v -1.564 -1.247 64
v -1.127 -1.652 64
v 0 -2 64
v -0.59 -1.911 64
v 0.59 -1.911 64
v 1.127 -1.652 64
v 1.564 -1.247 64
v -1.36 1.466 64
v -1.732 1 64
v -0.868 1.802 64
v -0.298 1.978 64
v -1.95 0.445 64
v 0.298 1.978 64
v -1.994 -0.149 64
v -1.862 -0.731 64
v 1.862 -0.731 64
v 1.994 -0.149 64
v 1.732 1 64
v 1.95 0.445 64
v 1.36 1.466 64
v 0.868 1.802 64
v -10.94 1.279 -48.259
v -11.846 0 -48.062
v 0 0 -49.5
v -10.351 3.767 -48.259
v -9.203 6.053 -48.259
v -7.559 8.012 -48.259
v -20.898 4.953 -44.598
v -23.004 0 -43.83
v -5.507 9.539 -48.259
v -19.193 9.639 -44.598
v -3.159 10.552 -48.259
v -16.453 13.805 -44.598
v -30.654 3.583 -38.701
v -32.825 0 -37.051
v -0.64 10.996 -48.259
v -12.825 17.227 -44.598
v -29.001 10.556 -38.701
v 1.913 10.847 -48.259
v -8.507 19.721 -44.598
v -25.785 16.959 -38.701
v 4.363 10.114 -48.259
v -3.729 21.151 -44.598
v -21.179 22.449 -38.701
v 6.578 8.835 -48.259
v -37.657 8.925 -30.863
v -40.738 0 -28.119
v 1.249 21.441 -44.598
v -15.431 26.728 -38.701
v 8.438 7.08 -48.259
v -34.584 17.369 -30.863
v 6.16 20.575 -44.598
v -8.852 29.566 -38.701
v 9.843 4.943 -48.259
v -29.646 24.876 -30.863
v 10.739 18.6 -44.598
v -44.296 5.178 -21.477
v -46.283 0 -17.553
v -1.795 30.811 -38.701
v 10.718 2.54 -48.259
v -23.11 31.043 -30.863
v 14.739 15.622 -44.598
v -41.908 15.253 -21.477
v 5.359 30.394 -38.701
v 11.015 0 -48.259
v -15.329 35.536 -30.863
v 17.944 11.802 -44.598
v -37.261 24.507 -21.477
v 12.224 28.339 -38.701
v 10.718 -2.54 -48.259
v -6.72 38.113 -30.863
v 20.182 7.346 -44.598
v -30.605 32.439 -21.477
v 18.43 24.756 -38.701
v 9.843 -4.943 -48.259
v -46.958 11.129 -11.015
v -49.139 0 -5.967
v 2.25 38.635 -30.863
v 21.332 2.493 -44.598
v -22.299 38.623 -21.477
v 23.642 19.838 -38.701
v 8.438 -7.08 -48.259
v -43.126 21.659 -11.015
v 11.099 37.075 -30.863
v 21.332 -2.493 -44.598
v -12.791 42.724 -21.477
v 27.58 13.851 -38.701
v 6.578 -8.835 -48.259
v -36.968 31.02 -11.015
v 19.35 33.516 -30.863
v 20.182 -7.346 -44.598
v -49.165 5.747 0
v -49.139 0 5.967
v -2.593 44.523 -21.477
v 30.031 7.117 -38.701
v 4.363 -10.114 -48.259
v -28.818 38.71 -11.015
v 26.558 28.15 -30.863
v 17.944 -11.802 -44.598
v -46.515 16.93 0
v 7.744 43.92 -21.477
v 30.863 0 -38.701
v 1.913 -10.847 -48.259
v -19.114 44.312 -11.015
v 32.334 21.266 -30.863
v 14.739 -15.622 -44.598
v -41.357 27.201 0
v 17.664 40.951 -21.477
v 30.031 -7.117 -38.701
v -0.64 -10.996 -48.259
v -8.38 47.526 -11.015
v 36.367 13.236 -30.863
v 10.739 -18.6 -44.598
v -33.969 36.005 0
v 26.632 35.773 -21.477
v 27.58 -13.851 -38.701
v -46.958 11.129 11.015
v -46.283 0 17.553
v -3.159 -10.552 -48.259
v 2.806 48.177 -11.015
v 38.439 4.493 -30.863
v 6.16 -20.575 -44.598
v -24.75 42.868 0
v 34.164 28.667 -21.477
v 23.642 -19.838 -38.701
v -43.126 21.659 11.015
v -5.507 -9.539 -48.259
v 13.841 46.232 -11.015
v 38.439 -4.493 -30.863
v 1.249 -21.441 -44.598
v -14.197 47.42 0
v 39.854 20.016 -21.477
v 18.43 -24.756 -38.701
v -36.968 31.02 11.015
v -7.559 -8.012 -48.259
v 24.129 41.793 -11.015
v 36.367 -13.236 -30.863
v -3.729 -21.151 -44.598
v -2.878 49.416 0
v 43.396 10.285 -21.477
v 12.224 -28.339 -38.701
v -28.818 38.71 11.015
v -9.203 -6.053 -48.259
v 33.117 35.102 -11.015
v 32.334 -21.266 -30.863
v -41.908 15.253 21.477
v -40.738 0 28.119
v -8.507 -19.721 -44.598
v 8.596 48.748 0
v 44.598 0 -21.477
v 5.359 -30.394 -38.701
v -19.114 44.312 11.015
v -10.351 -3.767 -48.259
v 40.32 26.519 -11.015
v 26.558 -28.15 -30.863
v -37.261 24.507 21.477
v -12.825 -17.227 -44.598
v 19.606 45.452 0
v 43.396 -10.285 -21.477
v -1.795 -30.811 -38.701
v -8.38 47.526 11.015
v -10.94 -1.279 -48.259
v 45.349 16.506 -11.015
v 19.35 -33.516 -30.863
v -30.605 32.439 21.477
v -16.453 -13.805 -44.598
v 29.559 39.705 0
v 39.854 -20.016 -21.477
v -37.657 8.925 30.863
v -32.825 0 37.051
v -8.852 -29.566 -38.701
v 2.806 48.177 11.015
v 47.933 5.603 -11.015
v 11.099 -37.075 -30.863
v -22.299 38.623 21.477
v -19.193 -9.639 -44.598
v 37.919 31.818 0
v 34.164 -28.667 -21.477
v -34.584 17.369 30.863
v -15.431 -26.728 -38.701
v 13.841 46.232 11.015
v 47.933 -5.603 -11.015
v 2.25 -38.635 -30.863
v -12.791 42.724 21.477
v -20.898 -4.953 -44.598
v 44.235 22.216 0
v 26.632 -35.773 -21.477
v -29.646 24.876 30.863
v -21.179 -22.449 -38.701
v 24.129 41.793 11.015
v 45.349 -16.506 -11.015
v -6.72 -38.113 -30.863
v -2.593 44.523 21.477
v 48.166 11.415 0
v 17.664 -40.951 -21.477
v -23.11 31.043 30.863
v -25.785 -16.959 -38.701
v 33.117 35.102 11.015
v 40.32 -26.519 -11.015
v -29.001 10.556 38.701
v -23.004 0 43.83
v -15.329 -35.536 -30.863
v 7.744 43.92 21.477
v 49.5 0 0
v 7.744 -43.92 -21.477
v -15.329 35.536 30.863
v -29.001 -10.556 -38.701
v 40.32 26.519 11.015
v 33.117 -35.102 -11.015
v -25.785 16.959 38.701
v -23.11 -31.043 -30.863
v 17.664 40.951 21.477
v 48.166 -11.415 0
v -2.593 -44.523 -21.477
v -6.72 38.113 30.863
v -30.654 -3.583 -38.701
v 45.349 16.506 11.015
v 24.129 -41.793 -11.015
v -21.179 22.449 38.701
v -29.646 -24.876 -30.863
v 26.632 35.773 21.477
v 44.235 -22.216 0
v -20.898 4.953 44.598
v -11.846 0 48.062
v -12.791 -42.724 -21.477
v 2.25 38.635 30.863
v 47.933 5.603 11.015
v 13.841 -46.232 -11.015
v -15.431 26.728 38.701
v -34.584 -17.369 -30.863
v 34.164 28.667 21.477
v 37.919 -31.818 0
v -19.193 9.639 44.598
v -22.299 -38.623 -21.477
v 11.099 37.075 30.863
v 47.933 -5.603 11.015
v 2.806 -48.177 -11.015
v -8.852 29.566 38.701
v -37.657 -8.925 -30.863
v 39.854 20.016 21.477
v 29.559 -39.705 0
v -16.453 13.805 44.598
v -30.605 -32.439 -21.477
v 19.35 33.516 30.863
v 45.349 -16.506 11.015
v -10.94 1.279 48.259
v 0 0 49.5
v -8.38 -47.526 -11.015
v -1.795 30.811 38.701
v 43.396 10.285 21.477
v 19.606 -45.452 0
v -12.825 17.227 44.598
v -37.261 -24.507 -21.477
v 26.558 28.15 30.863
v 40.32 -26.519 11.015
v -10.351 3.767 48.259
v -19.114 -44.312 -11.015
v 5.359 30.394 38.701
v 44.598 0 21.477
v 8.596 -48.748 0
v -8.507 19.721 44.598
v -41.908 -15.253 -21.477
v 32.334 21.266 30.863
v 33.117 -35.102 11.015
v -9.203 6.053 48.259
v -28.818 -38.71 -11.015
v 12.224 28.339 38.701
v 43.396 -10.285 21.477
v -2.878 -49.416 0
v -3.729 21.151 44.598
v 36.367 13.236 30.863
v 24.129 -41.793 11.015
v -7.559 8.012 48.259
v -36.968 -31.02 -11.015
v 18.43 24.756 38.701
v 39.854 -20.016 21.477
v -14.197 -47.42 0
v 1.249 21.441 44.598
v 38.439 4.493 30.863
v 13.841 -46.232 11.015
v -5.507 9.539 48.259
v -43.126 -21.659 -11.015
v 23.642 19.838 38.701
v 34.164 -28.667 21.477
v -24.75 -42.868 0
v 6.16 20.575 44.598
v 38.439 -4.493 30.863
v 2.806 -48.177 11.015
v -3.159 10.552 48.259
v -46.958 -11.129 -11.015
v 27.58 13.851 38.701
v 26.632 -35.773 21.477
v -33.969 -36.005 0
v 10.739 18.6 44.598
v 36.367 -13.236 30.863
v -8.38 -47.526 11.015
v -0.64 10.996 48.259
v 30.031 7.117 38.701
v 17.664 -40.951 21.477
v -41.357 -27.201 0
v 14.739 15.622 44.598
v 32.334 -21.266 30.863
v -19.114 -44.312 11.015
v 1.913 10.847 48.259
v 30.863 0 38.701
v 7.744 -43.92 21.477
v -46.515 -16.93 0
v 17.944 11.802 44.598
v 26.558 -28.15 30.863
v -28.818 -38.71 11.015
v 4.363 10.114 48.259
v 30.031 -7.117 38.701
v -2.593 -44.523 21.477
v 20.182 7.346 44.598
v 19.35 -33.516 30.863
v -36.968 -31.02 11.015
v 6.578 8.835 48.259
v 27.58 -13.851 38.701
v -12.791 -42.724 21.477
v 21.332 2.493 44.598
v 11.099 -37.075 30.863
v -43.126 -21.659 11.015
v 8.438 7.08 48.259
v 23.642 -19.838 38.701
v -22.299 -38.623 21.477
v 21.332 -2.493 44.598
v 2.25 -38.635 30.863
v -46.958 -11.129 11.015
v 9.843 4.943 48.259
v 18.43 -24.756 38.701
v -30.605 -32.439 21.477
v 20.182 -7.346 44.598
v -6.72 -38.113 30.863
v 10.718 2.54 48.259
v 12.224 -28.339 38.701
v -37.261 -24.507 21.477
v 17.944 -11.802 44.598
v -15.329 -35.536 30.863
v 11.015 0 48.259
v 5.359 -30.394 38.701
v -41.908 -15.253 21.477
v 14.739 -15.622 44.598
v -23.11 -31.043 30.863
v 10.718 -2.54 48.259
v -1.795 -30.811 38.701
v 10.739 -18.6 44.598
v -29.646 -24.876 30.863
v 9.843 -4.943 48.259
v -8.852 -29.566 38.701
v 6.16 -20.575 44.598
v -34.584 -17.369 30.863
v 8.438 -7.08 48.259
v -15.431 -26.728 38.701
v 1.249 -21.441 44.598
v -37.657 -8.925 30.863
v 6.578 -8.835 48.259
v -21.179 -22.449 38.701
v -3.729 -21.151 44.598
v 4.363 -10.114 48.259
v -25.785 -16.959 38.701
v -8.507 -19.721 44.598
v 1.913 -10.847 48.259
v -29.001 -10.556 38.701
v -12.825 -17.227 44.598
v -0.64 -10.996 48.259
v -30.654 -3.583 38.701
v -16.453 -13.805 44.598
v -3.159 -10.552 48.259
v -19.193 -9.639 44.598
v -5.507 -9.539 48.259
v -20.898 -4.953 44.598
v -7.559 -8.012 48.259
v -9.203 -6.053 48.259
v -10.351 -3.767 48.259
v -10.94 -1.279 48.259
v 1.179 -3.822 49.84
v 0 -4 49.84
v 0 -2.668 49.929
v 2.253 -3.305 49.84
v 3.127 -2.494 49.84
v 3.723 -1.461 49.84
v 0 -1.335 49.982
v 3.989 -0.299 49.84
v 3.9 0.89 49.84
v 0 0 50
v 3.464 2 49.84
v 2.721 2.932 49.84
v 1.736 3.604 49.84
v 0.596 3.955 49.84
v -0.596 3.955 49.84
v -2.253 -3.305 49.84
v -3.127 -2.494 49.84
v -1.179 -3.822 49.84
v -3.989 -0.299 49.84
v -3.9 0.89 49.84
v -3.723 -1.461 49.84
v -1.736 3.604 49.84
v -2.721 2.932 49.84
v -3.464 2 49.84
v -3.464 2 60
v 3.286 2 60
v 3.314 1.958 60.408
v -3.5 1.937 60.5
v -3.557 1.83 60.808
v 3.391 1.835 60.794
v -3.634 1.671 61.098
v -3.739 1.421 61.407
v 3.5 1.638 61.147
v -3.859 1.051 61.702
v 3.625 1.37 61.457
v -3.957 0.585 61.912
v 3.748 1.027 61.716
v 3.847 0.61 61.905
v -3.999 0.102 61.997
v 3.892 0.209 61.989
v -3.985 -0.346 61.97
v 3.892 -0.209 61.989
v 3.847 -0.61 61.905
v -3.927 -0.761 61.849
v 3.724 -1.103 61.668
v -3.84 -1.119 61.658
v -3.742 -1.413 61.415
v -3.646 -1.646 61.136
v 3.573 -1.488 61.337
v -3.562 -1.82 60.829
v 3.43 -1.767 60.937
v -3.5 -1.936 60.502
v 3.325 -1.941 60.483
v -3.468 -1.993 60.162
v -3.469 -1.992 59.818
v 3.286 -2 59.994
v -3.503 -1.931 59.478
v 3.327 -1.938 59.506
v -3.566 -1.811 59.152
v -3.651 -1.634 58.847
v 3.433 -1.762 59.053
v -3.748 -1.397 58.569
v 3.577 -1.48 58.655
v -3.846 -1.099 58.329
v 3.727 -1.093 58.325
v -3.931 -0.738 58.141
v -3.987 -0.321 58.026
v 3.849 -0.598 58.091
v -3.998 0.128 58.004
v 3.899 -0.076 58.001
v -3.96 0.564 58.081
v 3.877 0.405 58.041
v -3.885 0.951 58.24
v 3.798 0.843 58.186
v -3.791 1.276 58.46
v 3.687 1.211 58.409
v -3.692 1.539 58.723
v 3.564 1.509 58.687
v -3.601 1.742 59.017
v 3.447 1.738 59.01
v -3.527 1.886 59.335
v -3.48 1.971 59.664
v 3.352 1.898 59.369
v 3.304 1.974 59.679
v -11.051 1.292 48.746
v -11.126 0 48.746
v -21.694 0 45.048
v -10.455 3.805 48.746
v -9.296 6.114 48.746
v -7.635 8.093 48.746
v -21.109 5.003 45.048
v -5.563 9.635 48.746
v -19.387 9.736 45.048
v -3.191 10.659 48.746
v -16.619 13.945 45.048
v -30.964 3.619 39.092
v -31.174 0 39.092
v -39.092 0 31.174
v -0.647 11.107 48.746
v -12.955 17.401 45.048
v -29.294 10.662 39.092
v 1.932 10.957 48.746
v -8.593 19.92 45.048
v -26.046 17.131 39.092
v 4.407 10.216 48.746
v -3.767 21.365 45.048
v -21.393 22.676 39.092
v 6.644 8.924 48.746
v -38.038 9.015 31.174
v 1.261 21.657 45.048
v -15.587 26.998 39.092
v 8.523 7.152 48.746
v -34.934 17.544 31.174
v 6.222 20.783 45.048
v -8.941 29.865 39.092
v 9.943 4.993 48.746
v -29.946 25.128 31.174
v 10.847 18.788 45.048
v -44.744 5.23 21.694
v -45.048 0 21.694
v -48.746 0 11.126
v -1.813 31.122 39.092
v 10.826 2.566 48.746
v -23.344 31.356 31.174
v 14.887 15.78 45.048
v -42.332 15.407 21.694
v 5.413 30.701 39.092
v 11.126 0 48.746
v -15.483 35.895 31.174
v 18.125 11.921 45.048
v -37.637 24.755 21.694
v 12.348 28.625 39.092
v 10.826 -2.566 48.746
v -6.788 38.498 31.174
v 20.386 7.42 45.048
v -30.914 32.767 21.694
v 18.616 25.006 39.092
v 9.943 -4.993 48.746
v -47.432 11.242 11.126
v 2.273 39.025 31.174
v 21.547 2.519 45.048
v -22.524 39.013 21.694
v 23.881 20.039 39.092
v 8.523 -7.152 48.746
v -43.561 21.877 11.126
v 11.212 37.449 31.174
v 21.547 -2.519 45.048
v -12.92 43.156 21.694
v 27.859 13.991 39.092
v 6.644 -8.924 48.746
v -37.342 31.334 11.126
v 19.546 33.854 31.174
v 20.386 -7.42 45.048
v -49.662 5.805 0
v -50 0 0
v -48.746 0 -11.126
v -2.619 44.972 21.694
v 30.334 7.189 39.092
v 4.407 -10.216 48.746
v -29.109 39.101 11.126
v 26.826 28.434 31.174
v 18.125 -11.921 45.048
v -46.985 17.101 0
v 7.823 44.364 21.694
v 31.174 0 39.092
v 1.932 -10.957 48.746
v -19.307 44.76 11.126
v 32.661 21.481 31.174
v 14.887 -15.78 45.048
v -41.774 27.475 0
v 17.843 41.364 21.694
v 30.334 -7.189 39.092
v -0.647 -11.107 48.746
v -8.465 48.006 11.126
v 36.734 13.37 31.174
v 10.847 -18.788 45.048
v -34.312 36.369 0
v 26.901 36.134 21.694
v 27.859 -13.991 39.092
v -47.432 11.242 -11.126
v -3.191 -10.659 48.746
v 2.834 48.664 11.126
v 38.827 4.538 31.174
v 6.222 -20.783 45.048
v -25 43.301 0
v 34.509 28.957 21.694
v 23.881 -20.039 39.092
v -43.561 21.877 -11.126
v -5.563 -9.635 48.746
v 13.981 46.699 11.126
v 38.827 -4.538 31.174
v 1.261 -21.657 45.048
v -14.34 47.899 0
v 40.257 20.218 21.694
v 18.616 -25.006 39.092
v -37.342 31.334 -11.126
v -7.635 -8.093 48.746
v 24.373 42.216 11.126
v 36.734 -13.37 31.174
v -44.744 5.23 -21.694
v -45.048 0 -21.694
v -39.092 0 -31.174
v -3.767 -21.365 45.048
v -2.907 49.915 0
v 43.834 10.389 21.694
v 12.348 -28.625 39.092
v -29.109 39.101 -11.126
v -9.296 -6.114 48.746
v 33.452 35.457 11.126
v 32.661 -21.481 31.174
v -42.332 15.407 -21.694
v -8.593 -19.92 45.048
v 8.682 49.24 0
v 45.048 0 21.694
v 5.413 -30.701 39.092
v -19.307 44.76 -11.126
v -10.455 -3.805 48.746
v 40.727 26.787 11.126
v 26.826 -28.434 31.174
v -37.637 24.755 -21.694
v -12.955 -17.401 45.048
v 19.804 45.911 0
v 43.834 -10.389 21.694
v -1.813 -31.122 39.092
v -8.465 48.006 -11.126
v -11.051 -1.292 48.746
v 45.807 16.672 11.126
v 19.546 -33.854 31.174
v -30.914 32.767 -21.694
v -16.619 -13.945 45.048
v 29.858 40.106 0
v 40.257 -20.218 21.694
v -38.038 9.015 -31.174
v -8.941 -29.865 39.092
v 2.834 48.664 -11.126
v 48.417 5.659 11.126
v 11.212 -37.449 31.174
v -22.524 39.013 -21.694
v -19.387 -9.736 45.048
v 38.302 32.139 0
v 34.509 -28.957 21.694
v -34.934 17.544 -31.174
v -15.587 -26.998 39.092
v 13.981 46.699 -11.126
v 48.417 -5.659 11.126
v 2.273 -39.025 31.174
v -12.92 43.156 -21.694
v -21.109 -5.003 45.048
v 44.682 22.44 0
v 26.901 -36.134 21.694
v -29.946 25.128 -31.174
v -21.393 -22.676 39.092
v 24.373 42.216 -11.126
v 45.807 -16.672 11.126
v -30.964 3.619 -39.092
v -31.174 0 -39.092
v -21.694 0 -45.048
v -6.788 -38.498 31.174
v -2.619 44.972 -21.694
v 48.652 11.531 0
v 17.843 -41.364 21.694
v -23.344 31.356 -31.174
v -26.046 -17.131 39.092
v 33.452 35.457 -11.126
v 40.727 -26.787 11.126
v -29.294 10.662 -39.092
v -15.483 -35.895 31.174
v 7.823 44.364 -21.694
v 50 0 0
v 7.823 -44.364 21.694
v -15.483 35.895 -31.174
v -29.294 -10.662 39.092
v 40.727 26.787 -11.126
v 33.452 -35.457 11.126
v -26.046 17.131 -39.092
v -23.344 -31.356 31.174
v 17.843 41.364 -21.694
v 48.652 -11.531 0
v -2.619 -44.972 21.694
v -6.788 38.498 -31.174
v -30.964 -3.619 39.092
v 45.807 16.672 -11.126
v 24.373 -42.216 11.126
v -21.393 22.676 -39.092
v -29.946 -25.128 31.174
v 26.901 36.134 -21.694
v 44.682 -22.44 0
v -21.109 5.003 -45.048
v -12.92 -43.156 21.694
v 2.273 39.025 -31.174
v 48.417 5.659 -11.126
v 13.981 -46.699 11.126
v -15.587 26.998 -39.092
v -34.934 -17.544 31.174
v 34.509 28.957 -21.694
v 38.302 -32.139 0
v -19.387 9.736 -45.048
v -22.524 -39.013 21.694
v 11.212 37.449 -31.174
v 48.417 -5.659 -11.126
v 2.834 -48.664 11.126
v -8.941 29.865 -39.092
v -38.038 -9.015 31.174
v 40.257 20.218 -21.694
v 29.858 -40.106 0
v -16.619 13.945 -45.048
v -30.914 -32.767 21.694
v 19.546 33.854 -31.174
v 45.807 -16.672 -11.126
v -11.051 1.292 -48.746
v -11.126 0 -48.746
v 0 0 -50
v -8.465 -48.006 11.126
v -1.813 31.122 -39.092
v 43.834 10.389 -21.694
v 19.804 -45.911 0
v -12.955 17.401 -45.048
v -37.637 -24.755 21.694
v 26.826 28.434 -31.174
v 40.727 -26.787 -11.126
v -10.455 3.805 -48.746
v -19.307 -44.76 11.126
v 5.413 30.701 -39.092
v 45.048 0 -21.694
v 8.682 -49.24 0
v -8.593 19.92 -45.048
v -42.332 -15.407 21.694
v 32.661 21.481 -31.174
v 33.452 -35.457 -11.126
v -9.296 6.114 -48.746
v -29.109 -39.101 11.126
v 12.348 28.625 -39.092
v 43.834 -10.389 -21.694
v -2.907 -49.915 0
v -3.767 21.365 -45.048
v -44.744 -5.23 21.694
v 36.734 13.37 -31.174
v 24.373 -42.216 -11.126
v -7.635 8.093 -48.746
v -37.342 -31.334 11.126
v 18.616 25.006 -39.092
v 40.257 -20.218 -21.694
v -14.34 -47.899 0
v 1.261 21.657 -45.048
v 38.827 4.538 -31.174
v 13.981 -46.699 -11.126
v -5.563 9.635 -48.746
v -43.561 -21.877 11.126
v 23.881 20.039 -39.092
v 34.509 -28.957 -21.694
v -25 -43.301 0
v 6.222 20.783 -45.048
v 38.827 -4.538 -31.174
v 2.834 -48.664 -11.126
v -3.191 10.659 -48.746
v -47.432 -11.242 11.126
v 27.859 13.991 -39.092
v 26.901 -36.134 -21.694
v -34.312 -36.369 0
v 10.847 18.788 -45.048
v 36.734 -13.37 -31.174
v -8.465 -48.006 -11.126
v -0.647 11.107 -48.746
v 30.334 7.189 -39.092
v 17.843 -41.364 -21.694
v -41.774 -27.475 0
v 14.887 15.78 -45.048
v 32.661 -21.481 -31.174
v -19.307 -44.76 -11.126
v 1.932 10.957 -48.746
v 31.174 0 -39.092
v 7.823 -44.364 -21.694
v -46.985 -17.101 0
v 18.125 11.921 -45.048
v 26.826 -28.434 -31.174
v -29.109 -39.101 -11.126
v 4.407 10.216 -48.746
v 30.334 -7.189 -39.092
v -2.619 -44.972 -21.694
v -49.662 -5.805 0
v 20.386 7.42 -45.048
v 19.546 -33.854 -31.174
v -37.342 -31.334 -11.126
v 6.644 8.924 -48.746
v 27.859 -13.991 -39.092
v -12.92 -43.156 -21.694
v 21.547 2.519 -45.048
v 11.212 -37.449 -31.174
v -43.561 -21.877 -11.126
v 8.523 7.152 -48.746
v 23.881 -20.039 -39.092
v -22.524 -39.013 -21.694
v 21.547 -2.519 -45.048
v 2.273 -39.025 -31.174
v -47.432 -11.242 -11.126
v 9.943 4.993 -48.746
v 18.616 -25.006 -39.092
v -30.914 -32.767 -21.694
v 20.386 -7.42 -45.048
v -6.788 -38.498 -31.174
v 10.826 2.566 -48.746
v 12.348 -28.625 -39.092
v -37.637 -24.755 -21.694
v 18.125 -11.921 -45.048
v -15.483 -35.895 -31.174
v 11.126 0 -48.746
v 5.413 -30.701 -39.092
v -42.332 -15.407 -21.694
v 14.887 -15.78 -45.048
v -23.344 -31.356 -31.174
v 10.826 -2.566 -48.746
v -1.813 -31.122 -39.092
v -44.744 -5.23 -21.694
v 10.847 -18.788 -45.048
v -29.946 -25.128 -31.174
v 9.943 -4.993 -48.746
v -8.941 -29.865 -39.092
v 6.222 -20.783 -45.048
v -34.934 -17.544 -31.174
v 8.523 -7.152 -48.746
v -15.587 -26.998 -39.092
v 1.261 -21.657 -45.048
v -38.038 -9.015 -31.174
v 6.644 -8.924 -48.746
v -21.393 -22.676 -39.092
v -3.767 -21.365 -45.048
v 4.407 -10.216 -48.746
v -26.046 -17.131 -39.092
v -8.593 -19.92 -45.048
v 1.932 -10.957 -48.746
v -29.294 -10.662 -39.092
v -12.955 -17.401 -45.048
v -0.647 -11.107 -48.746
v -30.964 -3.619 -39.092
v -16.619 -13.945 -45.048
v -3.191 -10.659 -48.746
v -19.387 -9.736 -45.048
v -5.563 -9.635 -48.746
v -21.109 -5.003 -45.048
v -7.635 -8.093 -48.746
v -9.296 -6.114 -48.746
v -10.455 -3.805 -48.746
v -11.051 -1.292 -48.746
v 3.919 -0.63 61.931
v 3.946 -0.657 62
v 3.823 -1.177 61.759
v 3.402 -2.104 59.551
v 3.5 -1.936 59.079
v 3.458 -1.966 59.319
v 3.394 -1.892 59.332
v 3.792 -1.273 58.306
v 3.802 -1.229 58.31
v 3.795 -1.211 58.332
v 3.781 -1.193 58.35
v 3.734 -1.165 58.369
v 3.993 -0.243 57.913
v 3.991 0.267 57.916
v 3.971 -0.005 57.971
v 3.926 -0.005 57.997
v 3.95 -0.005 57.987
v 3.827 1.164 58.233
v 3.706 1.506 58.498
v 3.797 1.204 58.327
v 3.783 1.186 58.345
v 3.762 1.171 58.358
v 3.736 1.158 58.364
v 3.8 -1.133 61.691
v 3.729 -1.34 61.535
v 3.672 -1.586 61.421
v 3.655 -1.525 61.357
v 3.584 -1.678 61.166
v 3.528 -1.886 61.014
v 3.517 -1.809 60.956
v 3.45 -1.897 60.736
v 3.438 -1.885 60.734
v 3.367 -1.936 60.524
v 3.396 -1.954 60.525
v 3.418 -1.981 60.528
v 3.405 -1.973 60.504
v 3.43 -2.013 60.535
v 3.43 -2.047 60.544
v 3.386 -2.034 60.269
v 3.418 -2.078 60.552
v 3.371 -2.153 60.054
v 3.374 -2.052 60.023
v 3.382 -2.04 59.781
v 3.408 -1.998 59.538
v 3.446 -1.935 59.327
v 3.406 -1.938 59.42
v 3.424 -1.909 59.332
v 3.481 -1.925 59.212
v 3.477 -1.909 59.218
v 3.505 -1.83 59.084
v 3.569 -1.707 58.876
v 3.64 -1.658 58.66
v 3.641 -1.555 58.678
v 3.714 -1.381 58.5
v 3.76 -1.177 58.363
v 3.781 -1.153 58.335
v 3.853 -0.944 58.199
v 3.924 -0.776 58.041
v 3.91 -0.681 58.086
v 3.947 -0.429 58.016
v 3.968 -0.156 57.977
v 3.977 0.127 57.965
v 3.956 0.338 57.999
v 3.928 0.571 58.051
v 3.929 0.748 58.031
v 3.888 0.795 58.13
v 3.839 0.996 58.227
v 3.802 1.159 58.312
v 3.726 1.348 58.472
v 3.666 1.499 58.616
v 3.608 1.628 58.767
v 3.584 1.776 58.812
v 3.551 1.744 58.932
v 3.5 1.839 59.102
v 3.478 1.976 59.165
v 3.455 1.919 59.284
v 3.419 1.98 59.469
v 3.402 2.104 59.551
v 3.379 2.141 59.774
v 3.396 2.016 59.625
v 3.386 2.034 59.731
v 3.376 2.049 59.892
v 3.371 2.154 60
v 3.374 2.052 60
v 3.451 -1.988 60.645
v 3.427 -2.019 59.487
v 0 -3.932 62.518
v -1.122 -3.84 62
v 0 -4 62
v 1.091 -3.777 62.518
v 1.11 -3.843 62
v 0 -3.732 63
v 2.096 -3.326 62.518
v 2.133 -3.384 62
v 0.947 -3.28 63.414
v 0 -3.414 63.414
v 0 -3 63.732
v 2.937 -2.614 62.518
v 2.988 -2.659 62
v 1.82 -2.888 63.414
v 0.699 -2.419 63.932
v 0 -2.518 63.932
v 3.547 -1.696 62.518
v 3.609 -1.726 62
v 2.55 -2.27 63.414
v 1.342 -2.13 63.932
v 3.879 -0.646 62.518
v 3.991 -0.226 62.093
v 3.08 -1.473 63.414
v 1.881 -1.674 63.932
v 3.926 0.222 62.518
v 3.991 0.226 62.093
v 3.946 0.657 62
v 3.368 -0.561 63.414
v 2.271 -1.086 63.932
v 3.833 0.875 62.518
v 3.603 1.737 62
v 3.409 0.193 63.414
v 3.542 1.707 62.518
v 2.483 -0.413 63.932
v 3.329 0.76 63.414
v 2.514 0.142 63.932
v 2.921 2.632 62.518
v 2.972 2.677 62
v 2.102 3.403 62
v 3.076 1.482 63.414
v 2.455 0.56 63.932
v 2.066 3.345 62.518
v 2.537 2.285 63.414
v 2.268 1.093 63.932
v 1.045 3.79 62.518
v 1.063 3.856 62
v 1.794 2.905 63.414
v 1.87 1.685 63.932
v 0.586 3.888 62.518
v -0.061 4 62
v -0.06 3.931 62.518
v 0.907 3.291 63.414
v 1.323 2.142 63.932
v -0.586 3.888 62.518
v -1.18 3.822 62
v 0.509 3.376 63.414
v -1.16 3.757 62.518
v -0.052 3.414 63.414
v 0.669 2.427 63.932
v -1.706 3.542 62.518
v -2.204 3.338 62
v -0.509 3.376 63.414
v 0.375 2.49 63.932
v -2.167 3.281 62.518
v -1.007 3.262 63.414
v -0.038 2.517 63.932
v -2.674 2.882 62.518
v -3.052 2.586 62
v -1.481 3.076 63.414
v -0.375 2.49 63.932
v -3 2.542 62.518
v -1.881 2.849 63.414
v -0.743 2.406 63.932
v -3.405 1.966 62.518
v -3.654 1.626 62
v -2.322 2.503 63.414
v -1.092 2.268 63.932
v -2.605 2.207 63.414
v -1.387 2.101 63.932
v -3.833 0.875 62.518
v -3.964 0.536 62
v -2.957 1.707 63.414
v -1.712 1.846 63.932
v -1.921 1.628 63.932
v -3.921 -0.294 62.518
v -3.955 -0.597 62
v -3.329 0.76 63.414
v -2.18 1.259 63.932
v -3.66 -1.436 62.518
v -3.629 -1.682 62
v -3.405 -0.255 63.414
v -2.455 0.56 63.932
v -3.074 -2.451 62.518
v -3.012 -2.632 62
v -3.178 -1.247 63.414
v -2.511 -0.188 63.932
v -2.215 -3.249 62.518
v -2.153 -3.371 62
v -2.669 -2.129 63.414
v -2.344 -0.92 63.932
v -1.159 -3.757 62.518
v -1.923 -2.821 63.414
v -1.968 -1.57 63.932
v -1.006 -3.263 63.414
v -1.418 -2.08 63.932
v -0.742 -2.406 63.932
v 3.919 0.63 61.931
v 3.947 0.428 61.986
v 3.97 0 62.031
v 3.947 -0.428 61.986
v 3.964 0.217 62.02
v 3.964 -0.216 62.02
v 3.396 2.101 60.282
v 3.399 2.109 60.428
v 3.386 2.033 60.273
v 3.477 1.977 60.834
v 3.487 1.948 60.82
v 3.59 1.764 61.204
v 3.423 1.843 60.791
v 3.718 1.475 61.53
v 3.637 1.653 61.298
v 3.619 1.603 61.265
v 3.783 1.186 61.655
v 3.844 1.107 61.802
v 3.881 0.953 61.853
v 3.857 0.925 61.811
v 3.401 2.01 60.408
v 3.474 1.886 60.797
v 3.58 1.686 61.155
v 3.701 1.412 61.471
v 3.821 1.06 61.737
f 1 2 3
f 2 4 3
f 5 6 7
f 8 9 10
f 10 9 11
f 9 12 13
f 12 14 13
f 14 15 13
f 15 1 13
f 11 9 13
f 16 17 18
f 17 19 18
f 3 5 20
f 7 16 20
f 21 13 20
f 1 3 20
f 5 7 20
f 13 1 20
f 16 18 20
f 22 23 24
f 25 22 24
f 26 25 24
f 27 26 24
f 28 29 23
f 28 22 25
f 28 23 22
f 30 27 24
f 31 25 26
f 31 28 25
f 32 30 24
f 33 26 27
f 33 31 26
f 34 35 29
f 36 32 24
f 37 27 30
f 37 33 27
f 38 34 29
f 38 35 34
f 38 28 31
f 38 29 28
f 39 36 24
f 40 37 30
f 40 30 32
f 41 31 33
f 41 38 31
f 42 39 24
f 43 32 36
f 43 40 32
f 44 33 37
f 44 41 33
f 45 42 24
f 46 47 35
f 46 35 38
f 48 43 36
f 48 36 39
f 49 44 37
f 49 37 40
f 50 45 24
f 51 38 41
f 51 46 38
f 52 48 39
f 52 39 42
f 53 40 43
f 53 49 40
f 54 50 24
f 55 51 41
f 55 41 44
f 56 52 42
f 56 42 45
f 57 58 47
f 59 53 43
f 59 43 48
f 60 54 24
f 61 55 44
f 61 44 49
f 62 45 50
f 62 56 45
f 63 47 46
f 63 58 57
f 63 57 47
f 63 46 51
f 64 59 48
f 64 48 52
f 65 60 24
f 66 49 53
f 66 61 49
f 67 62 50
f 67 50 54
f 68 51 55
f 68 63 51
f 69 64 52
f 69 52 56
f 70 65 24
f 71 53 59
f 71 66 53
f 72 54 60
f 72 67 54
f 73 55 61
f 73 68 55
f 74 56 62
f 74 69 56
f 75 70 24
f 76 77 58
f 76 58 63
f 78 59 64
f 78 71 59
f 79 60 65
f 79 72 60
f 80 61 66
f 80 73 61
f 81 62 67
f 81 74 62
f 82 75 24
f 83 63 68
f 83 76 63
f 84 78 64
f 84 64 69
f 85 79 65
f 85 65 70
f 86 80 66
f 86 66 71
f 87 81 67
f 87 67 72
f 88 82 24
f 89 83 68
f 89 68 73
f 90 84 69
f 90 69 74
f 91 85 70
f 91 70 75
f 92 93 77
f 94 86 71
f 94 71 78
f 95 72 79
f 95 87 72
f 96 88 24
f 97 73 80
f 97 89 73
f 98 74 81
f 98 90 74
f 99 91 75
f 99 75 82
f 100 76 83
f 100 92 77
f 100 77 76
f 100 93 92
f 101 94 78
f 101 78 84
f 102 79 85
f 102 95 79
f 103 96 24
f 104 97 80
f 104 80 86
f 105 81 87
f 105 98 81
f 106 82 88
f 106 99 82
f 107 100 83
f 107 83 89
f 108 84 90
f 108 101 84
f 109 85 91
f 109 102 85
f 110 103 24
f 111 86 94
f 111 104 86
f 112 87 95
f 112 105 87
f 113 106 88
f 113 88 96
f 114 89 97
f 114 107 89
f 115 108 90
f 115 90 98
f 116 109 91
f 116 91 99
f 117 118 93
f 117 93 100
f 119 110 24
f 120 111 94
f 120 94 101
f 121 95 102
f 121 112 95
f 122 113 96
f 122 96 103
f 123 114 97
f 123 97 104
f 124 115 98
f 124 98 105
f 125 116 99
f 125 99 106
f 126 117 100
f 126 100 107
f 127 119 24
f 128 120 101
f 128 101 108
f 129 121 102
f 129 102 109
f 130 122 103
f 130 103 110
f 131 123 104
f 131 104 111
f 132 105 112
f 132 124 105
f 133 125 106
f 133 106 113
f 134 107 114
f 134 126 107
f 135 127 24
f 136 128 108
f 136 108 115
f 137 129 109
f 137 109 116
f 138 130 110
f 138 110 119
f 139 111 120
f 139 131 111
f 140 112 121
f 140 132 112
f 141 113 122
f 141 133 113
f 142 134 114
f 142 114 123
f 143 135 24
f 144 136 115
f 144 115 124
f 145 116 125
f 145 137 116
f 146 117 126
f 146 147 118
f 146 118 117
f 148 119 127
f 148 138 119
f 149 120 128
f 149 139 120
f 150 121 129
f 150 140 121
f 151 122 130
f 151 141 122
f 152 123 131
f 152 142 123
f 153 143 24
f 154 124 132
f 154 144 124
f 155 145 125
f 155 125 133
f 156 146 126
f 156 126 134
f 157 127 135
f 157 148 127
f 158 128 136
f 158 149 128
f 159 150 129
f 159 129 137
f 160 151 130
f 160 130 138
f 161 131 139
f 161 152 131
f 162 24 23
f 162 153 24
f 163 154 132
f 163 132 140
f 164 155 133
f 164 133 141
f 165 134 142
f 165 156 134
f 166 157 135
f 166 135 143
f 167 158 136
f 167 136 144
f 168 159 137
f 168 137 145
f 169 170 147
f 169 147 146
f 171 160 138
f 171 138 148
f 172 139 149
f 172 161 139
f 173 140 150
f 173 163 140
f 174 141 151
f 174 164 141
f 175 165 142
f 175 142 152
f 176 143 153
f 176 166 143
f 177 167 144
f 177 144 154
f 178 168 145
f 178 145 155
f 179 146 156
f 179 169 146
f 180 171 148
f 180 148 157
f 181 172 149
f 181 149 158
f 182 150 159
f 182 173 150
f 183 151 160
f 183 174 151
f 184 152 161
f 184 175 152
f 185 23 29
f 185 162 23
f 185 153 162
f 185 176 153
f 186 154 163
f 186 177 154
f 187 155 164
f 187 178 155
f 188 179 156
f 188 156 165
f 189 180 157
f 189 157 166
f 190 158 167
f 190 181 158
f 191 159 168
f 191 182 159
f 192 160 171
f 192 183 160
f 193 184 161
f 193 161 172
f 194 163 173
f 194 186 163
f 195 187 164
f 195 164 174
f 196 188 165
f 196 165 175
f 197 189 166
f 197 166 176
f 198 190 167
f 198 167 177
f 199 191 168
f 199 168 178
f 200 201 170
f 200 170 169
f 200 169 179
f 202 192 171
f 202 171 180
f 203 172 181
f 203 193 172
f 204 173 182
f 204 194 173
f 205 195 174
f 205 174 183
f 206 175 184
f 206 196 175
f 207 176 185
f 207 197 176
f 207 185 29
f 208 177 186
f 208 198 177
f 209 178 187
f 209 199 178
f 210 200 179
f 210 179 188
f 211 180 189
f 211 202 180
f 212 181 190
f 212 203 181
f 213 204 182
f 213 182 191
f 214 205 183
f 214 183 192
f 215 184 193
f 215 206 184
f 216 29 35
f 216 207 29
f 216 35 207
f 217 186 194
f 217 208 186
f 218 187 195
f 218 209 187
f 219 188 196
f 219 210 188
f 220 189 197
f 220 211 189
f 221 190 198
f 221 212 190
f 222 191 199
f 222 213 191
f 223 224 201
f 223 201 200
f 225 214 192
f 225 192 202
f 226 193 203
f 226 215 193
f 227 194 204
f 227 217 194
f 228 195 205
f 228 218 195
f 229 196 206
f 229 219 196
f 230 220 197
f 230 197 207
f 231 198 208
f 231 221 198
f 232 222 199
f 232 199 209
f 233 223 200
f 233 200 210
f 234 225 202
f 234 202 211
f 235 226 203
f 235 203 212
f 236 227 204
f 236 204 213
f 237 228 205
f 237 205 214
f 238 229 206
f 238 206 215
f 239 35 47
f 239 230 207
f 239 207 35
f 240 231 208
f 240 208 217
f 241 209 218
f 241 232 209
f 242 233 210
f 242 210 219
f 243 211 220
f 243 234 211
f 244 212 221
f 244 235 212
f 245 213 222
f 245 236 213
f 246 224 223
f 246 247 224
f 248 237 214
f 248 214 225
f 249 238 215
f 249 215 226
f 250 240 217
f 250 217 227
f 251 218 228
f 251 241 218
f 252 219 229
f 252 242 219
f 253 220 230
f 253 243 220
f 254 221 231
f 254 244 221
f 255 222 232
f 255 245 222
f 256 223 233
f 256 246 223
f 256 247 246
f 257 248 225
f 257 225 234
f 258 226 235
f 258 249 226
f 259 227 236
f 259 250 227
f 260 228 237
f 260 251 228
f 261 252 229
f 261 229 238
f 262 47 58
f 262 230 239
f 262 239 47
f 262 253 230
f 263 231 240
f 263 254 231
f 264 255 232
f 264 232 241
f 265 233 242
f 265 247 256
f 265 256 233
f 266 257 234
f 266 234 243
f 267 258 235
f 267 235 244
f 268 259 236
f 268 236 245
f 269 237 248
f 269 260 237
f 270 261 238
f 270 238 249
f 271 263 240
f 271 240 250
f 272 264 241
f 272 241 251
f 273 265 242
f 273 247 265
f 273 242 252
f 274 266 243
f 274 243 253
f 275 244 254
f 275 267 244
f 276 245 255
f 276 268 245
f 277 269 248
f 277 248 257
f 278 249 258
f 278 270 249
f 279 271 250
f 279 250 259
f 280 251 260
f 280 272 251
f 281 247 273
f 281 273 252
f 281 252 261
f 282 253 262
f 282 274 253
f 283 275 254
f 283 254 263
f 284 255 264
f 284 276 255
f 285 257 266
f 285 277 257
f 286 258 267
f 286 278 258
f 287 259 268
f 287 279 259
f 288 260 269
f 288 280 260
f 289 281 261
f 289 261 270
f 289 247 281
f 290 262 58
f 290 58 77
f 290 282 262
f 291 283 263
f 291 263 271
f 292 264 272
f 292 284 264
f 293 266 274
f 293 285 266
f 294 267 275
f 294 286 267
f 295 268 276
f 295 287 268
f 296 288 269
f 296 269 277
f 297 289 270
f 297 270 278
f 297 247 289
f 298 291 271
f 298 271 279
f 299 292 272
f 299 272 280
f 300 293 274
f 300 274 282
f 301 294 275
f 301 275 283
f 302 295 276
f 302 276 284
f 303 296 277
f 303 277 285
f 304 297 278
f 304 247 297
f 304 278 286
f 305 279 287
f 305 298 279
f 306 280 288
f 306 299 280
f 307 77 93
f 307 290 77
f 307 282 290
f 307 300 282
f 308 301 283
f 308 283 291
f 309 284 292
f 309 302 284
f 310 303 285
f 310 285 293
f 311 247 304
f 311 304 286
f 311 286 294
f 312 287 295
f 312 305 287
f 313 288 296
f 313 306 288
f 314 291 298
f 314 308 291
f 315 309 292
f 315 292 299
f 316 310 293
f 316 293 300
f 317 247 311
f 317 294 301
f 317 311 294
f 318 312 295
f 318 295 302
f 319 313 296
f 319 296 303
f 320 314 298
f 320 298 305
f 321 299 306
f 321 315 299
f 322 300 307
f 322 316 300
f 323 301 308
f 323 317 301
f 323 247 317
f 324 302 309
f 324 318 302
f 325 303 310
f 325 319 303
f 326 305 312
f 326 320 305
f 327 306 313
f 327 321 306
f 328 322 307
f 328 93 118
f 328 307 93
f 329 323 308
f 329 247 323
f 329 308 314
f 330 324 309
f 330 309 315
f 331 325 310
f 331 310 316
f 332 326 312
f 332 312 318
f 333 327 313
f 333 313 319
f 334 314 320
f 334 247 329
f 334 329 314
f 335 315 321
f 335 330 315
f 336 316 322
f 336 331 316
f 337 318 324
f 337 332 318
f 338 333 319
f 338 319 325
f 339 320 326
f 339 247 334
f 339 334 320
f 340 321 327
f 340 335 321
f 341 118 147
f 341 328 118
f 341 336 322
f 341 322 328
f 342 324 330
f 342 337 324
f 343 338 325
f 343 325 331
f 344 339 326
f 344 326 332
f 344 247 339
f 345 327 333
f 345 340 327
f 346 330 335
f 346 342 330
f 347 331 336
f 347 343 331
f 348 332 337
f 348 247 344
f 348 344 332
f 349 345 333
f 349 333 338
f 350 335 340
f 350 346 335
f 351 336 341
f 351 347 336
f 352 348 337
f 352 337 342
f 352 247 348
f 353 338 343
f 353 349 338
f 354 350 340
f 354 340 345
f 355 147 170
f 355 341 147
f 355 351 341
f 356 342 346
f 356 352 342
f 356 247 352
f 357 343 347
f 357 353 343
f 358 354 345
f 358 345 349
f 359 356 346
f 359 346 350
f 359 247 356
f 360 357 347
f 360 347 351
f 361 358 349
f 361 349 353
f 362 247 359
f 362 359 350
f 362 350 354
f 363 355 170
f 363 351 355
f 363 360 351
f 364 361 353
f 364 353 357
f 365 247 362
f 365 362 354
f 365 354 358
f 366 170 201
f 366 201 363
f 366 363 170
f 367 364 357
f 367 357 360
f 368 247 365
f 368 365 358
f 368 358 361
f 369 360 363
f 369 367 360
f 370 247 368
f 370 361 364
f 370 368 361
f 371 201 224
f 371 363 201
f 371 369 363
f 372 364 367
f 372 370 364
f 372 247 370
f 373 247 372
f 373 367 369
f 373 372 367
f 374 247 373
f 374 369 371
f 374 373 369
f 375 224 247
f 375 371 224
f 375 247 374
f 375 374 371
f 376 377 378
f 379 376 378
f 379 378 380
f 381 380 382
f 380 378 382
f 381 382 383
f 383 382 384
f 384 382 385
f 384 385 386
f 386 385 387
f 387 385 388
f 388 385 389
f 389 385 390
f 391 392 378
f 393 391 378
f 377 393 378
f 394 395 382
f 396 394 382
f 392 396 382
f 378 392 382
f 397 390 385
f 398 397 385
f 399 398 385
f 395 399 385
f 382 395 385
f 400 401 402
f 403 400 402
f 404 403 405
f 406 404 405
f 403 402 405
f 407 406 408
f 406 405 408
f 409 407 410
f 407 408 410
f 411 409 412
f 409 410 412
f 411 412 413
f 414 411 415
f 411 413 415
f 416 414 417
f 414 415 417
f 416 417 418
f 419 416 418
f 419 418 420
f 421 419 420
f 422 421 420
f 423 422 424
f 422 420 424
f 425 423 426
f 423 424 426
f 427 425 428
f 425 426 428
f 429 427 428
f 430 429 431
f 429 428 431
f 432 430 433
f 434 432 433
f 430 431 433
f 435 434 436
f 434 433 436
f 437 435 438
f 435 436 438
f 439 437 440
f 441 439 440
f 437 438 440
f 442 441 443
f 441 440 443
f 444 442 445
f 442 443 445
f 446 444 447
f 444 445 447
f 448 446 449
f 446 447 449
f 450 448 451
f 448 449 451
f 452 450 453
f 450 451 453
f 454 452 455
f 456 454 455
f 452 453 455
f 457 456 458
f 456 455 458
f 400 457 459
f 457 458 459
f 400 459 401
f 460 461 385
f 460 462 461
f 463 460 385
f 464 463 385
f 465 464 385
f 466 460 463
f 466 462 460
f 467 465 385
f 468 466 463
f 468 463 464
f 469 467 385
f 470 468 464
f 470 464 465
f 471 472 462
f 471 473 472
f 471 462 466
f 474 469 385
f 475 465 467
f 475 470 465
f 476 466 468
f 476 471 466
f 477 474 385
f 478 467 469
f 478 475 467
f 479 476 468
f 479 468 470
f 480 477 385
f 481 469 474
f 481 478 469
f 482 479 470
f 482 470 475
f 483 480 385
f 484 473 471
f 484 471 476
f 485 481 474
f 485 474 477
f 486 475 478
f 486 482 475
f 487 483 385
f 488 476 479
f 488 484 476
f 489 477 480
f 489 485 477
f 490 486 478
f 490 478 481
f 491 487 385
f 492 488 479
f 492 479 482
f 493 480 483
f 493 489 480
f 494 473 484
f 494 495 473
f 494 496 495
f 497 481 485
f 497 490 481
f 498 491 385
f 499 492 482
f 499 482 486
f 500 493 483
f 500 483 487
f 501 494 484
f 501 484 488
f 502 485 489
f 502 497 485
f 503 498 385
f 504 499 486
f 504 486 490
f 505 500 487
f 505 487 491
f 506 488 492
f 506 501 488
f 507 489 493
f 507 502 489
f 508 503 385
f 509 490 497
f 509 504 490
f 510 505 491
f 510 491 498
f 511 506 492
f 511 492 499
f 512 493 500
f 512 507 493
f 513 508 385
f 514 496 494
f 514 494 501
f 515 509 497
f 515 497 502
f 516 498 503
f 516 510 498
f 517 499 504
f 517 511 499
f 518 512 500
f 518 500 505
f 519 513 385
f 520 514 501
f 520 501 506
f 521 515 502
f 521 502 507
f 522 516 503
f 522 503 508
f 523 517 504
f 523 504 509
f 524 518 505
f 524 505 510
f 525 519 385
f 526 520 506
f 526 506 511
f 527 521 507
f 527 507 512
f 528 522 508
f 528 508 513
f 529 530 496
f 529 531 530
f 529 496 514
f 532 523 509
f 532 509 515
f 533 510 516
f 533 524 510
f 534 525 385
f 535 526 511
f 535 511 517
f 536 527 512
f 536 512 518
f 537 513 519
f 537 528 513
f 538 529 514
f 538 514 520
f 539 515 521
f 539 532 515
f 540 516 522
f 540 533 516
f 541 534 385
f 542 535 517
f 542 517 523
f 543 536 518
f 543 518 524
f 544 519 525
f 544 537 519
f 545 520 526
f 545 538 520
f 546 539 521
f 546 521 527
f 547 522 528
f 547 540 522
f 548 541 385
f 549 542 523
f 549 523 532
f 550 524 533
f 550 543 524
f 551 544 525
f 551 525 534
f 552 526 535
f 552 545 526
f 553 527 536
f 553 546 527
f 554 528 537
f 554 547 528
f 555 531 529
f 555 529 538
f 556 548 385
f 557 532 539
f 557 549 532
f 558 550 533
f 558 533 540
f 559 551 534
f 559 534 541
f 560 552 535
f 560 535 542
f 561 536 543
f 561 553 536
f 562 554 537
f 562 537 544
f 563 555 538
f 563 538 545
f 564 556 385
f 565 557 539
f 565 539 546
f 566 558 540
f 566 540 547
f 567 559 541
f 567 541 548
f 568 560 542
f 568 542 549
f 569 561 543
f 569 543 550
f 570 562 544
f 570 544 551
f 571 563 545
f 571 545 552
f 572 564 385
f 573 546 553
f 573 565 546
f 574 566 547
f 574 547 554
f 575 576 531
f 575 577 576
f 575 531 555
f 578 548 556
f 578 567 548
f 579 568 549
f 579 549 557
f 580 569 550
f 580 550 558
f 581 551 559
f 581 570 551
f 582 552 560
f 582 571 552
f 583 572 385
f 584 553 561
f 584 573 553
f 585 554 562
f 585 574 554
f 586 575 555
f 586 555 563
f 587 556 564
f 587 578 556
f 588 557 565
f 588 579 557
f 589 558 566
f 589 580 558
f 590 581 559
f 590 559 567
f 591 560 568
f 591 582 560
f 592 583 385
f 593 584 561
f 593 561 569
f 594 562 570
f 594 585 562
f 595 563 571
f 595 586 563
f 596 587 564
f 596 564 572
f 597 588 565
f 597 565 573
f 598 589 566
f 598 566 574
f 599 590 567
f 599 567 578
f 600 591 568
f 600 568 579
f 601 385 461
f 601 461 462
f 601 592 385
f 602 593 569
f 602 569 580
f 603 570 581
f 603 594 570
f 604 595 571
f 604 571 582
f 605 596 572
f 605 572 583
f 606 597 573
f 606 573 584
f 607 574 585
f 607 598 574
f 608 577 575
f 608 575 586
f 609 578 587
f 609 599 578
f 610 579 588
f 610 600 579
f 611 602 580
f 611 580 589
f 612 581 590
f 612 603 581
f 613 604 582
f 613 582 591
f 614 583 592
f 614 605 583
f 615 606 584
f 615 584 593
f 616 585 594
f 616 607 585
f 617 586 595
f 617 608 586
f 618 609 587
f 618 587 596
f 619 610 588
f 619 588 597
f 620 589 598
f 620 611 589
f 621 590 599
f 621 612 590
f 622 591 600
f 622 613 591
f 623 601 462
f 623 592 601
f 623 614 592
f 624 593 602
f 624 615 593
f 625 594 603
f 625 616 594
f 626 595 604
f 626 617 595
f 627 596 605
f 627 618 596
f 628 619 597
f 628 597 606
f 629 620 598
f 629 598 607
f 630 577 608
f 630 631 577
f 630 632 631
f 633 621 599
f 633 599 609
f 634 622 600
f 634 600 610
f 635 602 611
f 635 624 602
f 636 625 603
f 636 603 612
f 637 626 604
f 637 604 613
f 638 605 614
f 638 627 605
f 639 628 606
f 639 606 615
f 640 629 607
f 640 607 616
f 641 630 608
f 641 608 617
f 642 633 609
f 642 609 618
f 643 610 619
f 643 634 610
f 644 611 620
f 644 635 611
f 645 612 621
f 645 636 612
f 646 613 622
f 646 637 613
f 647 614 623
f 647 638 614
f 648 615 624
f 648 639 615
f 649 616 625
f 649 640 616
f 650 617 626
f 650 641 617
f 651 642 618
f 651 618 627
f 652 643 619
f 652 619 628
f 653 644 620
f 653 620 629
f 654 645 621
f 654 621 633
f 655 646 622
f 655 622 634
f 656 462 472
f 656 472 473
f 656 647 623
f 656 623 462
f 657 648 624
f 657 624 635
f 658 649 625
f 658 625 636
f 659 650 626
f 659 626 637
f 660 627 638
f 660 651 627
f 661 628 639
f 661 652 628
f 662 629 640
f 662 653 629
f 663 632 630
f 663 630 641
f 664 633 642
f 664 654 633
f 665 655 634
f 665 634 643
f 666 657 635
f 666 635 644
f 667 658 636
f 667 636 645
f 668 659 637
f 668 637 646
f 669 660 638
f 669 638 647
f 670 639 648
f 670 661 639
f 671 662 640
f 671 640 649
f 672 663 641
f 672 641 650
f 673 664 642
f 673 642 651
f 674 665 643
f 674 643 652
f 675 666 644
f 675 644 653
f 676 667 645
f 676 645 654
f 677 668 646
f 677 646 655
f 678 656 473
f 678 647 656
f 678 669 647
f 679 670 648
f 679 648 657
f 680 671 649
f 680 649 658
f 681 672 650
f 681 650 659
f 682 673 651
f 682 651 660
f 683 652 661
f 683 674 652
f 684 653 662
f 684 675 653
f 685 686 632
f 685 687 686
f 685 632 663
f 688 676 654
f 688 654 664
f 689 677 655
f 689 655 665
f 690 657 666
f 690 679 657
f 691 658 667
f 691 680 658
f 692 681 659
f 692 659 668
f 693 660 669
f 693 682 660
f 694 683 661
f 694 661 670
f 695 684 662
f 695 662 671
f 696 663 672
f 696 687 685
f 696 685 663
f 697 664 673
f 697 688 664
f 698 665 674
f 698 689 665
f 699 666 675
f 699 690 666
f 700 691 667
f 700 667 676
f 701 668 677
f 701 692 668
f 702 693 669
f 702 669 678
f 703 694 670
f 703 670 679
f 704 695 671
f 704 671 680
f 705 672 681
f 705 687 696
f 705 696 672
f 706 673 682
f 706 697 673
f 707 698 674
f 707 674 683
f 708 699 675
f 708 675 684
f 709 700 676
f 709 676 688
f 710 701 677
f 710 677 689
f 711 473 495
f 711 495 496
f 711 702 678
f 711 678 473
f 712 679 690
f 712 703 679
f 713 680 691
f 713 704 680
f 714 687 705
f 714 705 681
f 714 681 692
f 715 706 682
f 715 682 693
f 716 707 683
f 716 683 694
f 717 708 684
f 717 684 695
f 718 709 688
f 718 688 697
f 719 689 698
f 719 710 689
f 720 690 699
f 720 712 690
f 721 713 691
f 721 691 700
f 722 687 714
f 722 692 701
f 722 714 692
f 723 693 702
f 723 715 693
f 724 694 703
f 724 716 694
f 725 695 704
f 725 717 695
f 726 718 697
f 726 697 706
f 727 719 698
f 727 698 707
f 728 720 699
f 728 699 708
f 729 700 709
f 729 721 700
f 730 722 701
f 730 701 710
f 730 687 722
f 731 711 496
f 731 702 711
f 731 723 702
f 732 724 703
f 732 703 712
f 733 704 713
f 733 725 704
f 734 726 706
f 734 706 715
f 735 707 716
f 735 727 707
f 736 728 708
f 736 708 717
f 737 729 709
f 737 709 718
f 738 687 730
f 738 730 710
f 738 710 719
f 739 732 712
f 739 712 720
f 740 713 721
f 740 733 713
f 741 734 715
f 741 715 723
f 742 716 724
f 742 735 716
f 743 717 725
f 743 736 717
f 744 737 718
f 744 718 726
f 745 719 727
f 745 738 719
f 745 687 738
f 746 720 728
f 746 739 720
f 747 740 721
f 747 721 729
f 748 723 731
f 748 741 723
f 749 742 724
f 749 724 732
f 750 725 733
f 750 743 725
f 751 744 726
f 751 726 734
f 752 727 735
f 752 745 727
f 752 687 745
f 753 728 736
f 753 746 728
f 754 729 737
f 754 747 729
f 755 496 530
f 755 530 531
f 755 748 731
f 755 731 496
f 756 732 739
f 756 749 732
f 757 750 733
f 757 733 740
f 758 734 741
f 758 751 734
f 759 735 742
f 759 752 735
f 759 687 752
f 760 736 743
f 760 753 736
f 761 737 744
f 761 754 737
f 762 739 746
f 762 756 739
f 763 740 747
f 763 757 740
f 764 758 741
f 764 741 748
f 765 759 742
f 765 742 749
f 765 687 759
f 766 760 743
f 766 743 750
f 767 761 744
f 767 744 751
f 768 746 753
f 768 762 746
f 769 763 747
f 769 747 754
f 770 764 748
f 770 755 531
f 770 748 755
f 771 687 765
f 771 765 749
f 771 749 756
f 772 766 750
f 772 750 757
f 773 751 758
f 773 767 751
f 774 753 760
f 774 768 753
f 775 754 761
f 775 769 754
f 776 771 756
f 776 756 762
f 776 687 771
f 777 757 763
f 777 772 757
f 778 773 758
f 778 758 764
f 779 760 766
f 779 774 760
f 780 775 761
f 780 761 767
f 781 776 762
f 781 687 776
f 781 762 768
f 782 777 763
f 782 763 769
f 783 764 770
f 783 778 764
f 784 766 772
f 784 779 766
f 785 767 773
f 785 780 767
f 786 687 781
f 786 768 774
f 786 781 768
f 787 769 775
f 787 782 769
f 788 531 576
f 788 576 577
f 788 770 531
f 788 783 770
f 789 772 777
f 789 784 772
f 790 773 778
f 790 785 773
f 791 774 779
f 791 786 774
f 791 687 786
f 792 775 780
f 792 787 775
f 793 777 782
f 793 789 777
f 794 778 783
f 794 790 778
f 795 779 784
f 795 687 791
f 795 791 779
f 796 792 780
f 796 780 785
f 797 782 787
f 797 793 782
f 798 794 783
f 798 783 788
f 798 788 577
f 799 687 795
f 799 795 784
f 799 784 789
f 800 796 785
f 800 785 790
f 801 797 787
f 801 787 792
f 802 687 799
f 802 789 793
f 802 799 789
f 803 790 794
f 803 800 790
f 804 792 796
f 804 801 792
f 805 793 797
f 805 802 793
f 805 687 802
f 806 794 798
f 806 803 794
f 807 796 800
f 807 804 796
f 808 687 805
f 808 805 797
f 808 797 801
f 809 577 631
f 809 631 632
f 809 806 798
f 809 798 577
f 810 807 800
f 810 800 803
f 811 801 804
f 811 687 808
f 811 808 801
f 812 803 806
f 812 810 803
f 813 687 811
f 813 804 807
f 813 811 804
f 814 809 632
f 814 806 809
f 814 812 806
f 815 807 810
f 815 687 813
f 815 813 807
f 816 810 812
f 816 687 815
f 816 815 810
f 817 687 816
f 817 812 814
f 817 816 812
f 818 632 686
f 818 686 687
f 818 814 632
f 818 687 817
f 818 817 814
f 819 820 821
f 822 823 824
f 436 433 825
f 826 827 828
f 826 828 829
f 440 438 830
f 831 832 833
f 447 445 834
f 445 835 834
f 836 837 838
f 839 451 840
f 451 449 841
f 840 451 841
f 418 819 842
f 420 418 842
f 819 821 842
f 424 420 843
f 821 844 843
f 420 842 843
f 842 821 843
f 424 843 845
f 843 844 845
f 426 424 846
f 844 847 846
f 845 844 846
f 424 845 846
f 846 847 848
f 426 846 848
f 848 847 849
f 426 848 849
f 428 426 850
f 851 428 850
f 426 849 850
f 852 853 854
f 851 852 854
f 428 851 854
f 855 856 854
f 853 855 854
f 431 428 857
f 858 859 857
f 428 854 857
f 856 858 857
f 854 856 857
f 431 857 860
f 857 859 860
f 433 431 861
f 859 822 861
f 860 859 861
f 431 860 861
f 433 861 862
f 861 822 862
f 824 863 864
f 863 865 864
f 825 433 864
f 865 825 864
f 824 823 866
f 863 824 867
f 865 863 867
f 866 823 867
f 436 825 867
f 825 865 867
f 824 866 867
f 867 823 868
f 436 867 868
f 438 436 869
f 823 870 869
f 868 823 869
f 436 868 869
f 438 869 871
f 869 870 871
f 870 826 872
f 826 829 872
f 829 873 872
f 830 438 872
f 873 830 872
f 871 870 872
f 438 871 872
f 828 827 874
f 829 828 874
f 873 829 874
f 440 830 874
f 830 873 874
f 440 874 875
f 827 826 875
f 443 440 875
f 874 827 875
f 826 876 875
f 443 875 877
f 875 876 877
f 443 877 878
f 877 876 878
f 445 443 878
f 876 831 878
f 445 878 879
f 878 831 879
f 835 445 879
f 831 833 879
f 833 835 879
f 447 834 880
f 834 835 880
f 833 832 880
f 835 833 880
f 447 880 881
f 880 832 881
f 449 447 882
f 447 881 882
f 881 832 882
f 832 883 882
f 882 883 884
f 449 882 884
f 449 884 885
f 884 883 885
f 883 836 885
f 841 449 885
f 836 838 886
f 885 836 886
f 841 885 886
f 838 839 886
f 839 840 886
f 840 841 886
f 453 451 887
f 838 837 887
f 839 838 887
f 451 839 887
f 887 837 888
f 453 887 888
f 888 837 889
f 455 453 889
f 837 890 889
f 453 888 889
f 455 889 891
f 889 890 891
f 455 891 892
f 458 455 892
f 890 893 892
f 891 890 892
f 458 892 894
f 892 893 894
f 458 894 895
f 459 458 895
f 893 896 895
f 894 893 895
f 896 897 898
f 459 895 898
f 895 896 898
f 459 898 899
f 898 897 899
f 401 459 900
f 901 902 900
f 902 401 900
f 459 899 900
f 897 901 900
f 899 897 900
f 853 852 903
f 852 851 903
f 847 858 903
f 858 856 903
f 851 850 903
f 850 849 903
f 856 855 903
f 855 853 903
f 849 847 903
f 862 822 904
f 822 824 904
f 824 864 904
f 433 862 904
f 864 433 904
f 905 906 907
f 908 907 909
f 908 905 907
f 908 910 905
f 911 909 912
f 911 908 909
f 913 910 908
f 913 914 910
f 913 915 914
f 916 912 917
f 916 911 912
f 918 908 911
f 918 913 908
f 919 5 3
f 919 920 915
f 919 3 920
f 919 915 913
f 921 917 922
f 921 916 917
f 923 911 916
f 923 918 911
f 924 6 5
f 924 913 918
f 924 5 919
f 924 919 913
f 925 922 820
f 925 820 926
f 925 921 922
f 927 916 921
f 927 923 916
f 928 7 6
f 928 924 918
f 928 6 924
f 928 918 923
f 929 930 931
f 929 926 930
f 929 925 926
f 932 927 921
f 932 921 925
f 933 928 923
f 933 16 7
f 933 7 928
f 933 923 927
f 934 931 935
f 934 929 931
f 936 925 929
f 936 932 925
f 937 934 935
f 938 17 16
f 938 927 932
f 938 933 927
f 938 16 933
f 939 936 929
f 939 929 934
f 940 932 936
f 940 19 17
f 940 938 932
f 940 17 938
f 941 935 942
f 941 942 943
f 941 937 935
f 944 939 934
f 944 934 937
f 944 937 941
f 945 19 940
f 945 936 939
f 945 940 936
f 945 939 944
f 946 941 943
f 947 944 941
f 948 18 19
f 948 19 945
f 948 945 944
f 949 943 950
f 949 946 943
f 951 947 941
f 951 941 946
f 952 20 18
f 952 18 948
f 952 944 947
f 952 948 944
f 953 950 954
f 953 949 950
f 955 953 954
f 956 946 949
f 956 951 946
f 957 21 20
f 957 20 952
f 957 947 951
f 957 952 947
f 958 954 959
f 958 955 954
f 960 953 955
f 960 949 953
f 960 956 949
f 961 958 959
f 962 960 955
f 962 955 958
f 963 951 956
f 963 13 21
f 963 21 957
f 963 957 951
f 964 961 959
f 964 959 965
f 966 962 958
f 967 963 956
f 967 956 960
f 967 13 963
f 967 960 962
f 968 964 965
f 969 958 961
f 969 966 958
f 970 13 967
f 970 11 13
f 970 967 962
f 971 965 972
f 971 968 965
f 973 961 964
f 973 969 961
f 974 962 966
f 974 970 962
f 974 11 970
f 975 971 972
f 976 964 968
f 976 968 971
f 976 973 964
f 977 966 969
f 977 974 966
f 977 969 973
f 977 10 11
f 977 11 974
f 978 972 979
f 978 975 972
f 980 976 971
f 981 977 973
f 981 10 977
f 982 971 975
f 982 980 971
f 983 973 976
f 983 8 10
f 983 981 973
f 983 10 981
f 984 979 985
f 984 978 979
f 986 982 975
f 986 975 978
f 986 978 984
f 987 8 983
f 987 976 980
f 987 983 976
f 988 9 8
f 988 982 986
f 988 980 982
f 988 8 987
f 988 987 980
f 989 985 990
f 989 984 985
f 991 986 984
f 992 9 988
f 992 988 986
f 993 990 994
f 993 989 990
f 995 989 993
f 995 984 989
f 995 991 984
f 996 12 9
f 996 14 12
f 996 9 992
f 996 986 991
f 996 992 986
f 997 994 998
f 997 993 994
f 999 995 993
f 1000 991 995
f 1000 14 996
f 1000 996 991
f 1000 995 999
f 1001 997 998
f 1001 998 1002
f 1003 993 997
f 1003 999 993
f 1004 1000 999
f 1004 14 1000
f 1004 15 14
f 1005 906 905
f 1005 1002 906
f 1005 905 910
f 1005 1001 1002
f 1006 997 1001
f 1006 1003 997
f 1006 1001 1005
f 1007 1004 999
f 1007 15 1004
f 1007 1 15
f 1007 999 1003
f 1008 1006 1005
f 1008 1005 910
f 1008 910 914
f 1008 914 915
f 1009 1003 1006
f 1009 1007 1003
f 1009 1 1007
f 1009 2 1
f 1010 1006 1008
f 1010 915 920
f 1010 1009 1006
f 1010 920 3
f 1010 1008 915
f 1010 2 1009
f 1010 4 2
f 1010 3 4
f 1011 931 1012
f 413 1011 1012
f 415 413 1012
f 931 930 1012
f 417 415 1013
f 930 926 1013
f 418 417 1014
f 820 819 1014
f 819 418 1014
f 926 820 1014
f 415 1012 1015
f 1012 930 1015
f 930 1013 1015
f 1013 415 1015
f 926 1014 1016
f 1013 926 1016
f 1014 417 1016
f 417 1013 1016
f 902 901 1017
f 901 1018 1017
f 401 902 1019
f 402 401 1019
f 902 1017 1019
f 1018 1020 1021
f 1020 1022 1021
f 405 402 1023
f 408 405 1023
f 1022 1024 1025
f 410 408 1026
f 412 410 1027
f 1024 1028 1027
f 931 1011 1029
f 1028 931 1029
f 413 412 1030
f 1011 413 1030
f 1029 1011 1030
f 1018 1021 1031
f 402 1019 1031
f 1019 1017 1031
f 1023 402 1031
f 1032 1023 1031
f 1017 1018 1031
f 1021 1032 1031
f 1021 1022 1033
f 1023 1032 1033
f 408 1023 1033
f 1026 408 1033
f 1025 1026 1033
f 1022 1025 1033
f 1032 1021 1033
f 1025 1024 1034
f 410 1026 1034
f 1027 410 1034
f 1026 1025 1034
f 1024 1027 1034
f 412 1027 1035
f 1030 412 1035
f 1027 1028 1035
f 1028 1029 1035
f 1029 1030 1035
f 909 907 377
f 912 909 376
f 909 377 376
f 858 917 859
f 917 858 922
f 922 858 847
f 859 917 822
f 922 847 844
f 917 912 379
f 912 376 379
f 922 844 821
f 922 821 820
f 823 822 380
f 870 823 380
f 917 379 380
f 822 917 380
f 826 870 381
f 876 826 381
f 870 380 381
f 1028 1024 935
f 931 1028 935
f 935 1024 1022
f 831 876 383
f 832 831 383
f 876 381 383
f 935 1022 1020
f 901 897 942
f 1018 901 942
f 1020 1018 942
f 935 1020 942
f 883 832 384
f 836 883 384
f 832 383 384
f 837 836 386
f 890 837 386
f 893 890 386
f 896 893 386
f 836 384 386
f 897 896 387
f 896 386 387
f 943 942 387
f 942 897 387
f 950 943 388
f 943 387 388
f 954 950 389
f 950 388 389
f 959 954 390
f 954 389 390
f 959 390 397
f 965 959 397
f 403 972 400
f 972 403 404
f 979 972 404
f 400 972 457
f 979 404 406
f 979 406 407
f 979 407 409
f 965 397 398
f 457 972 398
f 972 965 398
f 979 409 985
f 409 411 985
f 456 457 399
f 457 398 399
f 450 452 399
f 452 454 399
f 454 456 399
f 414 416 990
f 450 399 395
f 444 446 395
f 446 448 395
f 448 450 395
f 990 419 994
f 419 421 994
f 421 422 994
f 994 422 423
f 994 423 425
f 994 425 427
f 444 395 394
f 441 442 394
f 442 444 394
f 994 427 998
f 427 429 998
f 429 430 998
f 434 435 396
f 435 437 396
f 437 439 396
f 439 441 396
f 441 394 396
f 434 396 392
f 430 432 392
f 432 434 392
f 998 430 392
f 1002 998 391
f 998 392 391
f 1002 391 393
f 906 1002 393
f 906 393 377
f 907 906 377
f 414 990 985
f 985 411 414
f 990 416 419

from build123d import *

# Parameters (mm, degrees)
F4_R     = 2
F5_DEPTH = 12.5
F6_R     = 1.99999
F7_R     = 0.1


# Not quite as in the source:
# - a fillet or chamfer is up to 0.001 mm smaller than in the source, because OpenCascade refuses the exact size


with BuildPart() as f1:
    # F0 (on Front) → F1 (revolve)
    with BuildSketch(Plane.XZ):
        with BuildLine():
            Line((0, 49.5), (0, 50))
            ThreePointArc((0, 50), (-50, 0), (0, -50))
            Line((0, -50), (0, -49.5))
            ThreePointArc((0, -49.5), (-49.5, 0), (0, 49.5))
        make_face()
    revolve(axis=Axis((0, 0, 0), (0, 0, -1)))


with BuildPart() as f3:
    # F2 (on Right) → F3 (revolve)
    with BuildSketch(Plane.YZ):
        with BuildLine():
            ThreePointArc((-4, 49.8397431775), (-2.001604497, 49.9599197301), (0, 50))
            Line((0, 50), (0, 64))
            Line((0, 64), (-4, 64))
            Line((-4, 64), (-4, 49.8397431775))
        make_face()
    revolve(axis=Axis((0, 0, 56.9119527936), (0, 0, 1)))

    # F4 (on Right) → F5 (cut, symmetric)
    with BuildSketch(Plane.YZ):
        with Locations((0, 60)):
            Circle(F4_R)
    extrude(amount=F5_DEPTH, both=True, mode=Mode.SUBTRACT)

    # F6 (radius 2 in the source; OpenCascade refuses exactly that, so slightly less here)
    f6_edges = [f3.edges().sort_by_distance(p)[0] for p in [
        (0, 4, 64),
    ]]
    fillet(f6_edges, radius=F6_R)

    # F7
    f7_edges = [f3.edges().sort_by_distance(p)[0] for p in [
        (3.464102, -2, 60),
    ]]
    fillet(f7_edges, radius=F7_R)


solid = Compound([f1.part, f3.part])
